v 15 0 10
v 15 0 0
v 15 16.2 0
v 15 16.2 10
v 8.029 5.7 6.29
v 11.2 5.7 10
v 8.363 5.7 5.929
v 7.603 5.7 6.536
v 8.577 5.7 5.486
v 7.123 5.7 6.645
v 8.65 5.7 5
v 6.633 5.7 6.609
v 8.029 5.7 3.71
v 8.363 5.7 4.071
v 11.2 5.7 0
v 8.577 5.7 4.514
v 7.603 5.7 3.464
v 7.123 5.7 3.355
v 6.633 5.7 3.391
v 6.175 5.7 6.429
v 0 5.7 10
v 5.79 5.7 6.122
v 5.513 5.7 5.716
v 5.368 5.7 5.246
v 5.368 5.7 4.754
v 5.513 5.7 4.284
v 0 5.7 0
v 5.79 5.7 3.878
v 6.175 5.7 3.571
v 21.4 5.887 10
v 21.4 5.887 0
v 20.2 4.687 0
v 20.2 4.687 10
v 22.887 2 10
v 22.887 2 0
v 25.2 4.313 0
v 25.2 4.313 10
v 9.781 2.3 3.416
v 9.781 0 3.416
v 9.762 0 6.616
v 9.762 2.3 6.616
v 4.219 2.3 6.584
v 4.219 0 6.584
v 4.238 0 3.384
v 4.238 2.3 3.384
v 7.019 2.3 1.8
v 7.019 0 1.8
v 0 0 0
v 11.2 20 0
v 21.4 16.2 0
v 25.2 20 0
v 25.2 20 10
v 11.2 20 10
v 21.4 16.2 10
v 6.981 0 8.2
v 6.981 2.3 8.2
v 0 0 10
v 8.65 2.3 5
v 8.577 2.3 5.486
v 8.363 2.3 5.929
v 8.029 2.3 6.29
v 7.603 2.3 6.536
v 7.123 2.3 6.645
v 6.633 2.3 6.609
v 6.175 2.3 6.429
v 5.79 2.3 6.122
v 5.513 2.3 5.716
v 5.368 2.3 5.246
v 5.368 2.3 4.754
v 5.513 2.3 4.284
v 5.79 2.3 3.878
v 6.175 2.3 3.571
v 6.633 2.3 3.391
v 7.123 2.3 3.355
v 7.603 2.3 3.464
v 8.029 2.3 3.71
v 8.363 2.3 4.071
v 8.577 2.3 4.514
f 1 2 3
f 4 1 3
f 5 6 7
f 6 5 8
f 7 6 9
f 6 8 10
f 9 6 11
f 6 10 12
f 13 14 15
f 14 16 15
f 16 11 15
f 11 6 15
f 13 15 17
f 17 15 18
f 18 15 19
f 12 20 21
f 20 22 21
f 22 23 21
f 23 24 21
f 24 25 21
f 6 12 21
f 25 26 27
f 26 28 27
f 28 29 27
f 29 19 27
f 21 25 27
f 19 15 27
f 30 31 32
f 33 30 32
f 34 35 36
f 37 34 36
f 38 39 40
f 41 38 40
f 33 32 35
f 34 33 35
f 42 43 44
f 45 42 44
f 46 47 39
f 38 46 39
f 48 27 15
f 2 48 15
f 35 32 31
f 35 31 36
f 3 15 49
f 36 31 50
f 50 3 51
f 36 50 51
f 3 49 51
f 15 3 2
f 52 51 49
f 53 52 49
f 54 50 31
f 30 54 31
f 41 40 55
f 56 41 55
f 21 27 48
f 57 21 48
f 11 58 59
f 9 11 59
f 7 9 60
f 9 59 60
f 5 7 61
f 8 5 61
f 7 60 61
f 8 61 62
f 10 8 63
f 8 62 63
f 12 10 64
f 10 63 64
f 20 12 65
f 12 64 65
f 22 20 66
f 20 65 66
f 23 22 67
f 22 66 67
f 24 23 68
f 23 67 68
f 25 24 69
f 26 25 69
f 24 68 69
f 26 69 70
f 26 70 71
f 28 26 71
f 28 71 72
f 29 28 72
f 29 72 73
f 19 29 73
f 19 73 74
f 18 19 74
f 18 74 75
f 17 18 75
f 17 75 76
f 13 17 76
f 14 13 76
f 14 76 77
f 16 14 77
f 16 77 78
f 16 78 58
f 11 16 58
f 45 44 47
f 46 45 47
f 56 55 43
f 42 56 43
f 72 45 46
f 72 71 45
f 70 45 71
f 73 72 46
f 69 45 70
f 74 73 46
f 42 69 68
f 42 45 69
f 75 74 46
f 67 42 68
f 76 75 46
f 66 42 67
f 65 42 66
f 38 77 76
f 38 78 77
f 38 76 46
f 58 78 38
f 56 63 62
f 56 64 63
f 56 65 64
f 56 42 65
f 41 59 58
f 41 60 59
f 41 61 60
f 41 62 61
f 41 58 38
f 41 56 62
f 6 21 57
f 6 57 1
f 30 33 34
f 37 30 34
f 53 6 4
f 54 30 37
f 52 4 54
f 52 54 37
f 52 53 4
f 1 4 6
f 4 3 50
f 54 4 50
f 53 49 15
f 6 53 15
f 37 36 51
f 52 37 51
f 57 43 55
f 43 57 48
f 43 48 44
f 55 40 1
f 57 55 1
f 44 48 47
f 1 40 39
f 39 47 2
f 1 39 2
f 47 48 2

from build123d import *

# Parameters (mm, degrees)
F1_DEPTH = 10
F2_R     = 1.65
F4_DEPTH = 20.001
F5_DEPTH = 2.3


with BuildPart() as f1:
    # F0 (on Top) → F1 (new body)
    with BuildSketch(Plane.XY):
        Polygon((0, 5.7), (0, 0), (15, 0), (15, 16.2), (21.4, 16.2), (21.4, 5.8870057685), (20.2, 4.6870057685), (22.8870057685, 2), (25.2, 4.3129942315), (25.2, 20), (11.2, 20), (11.2, 5.7), align=None)
    extrude(amount=F1_DEPTH)

    # F2 (on face) → F4 (cut, through all)
    with BuildSketch(Plane.XZ):
        with Locations((7, 5)):
            Circle(F2_R)
    extrude(amount=-F4_DEPTH, mode=Mode.SUBTRACT)

    # F2 (on face) → F5 (cut)
    with BuildSketch(Plane.XZ):
        Polygon((6.9812222395, 8.1999449051), (4.2193775412, 6.5837104349), (4.2381553017, 3.3837655298), (7.0187777605, 1.8000550949), (9.7806224588, 3.4162895651), (9.7618446983, 6.6162344702), align=None)
        with Locations((7, 5)):
            Circle(F2_R, mode=Mode.SUBTRACT)
    extrude(amount=-F5_DEPTH, mode=Mode.SUBTRACT)


solid = f1.part
